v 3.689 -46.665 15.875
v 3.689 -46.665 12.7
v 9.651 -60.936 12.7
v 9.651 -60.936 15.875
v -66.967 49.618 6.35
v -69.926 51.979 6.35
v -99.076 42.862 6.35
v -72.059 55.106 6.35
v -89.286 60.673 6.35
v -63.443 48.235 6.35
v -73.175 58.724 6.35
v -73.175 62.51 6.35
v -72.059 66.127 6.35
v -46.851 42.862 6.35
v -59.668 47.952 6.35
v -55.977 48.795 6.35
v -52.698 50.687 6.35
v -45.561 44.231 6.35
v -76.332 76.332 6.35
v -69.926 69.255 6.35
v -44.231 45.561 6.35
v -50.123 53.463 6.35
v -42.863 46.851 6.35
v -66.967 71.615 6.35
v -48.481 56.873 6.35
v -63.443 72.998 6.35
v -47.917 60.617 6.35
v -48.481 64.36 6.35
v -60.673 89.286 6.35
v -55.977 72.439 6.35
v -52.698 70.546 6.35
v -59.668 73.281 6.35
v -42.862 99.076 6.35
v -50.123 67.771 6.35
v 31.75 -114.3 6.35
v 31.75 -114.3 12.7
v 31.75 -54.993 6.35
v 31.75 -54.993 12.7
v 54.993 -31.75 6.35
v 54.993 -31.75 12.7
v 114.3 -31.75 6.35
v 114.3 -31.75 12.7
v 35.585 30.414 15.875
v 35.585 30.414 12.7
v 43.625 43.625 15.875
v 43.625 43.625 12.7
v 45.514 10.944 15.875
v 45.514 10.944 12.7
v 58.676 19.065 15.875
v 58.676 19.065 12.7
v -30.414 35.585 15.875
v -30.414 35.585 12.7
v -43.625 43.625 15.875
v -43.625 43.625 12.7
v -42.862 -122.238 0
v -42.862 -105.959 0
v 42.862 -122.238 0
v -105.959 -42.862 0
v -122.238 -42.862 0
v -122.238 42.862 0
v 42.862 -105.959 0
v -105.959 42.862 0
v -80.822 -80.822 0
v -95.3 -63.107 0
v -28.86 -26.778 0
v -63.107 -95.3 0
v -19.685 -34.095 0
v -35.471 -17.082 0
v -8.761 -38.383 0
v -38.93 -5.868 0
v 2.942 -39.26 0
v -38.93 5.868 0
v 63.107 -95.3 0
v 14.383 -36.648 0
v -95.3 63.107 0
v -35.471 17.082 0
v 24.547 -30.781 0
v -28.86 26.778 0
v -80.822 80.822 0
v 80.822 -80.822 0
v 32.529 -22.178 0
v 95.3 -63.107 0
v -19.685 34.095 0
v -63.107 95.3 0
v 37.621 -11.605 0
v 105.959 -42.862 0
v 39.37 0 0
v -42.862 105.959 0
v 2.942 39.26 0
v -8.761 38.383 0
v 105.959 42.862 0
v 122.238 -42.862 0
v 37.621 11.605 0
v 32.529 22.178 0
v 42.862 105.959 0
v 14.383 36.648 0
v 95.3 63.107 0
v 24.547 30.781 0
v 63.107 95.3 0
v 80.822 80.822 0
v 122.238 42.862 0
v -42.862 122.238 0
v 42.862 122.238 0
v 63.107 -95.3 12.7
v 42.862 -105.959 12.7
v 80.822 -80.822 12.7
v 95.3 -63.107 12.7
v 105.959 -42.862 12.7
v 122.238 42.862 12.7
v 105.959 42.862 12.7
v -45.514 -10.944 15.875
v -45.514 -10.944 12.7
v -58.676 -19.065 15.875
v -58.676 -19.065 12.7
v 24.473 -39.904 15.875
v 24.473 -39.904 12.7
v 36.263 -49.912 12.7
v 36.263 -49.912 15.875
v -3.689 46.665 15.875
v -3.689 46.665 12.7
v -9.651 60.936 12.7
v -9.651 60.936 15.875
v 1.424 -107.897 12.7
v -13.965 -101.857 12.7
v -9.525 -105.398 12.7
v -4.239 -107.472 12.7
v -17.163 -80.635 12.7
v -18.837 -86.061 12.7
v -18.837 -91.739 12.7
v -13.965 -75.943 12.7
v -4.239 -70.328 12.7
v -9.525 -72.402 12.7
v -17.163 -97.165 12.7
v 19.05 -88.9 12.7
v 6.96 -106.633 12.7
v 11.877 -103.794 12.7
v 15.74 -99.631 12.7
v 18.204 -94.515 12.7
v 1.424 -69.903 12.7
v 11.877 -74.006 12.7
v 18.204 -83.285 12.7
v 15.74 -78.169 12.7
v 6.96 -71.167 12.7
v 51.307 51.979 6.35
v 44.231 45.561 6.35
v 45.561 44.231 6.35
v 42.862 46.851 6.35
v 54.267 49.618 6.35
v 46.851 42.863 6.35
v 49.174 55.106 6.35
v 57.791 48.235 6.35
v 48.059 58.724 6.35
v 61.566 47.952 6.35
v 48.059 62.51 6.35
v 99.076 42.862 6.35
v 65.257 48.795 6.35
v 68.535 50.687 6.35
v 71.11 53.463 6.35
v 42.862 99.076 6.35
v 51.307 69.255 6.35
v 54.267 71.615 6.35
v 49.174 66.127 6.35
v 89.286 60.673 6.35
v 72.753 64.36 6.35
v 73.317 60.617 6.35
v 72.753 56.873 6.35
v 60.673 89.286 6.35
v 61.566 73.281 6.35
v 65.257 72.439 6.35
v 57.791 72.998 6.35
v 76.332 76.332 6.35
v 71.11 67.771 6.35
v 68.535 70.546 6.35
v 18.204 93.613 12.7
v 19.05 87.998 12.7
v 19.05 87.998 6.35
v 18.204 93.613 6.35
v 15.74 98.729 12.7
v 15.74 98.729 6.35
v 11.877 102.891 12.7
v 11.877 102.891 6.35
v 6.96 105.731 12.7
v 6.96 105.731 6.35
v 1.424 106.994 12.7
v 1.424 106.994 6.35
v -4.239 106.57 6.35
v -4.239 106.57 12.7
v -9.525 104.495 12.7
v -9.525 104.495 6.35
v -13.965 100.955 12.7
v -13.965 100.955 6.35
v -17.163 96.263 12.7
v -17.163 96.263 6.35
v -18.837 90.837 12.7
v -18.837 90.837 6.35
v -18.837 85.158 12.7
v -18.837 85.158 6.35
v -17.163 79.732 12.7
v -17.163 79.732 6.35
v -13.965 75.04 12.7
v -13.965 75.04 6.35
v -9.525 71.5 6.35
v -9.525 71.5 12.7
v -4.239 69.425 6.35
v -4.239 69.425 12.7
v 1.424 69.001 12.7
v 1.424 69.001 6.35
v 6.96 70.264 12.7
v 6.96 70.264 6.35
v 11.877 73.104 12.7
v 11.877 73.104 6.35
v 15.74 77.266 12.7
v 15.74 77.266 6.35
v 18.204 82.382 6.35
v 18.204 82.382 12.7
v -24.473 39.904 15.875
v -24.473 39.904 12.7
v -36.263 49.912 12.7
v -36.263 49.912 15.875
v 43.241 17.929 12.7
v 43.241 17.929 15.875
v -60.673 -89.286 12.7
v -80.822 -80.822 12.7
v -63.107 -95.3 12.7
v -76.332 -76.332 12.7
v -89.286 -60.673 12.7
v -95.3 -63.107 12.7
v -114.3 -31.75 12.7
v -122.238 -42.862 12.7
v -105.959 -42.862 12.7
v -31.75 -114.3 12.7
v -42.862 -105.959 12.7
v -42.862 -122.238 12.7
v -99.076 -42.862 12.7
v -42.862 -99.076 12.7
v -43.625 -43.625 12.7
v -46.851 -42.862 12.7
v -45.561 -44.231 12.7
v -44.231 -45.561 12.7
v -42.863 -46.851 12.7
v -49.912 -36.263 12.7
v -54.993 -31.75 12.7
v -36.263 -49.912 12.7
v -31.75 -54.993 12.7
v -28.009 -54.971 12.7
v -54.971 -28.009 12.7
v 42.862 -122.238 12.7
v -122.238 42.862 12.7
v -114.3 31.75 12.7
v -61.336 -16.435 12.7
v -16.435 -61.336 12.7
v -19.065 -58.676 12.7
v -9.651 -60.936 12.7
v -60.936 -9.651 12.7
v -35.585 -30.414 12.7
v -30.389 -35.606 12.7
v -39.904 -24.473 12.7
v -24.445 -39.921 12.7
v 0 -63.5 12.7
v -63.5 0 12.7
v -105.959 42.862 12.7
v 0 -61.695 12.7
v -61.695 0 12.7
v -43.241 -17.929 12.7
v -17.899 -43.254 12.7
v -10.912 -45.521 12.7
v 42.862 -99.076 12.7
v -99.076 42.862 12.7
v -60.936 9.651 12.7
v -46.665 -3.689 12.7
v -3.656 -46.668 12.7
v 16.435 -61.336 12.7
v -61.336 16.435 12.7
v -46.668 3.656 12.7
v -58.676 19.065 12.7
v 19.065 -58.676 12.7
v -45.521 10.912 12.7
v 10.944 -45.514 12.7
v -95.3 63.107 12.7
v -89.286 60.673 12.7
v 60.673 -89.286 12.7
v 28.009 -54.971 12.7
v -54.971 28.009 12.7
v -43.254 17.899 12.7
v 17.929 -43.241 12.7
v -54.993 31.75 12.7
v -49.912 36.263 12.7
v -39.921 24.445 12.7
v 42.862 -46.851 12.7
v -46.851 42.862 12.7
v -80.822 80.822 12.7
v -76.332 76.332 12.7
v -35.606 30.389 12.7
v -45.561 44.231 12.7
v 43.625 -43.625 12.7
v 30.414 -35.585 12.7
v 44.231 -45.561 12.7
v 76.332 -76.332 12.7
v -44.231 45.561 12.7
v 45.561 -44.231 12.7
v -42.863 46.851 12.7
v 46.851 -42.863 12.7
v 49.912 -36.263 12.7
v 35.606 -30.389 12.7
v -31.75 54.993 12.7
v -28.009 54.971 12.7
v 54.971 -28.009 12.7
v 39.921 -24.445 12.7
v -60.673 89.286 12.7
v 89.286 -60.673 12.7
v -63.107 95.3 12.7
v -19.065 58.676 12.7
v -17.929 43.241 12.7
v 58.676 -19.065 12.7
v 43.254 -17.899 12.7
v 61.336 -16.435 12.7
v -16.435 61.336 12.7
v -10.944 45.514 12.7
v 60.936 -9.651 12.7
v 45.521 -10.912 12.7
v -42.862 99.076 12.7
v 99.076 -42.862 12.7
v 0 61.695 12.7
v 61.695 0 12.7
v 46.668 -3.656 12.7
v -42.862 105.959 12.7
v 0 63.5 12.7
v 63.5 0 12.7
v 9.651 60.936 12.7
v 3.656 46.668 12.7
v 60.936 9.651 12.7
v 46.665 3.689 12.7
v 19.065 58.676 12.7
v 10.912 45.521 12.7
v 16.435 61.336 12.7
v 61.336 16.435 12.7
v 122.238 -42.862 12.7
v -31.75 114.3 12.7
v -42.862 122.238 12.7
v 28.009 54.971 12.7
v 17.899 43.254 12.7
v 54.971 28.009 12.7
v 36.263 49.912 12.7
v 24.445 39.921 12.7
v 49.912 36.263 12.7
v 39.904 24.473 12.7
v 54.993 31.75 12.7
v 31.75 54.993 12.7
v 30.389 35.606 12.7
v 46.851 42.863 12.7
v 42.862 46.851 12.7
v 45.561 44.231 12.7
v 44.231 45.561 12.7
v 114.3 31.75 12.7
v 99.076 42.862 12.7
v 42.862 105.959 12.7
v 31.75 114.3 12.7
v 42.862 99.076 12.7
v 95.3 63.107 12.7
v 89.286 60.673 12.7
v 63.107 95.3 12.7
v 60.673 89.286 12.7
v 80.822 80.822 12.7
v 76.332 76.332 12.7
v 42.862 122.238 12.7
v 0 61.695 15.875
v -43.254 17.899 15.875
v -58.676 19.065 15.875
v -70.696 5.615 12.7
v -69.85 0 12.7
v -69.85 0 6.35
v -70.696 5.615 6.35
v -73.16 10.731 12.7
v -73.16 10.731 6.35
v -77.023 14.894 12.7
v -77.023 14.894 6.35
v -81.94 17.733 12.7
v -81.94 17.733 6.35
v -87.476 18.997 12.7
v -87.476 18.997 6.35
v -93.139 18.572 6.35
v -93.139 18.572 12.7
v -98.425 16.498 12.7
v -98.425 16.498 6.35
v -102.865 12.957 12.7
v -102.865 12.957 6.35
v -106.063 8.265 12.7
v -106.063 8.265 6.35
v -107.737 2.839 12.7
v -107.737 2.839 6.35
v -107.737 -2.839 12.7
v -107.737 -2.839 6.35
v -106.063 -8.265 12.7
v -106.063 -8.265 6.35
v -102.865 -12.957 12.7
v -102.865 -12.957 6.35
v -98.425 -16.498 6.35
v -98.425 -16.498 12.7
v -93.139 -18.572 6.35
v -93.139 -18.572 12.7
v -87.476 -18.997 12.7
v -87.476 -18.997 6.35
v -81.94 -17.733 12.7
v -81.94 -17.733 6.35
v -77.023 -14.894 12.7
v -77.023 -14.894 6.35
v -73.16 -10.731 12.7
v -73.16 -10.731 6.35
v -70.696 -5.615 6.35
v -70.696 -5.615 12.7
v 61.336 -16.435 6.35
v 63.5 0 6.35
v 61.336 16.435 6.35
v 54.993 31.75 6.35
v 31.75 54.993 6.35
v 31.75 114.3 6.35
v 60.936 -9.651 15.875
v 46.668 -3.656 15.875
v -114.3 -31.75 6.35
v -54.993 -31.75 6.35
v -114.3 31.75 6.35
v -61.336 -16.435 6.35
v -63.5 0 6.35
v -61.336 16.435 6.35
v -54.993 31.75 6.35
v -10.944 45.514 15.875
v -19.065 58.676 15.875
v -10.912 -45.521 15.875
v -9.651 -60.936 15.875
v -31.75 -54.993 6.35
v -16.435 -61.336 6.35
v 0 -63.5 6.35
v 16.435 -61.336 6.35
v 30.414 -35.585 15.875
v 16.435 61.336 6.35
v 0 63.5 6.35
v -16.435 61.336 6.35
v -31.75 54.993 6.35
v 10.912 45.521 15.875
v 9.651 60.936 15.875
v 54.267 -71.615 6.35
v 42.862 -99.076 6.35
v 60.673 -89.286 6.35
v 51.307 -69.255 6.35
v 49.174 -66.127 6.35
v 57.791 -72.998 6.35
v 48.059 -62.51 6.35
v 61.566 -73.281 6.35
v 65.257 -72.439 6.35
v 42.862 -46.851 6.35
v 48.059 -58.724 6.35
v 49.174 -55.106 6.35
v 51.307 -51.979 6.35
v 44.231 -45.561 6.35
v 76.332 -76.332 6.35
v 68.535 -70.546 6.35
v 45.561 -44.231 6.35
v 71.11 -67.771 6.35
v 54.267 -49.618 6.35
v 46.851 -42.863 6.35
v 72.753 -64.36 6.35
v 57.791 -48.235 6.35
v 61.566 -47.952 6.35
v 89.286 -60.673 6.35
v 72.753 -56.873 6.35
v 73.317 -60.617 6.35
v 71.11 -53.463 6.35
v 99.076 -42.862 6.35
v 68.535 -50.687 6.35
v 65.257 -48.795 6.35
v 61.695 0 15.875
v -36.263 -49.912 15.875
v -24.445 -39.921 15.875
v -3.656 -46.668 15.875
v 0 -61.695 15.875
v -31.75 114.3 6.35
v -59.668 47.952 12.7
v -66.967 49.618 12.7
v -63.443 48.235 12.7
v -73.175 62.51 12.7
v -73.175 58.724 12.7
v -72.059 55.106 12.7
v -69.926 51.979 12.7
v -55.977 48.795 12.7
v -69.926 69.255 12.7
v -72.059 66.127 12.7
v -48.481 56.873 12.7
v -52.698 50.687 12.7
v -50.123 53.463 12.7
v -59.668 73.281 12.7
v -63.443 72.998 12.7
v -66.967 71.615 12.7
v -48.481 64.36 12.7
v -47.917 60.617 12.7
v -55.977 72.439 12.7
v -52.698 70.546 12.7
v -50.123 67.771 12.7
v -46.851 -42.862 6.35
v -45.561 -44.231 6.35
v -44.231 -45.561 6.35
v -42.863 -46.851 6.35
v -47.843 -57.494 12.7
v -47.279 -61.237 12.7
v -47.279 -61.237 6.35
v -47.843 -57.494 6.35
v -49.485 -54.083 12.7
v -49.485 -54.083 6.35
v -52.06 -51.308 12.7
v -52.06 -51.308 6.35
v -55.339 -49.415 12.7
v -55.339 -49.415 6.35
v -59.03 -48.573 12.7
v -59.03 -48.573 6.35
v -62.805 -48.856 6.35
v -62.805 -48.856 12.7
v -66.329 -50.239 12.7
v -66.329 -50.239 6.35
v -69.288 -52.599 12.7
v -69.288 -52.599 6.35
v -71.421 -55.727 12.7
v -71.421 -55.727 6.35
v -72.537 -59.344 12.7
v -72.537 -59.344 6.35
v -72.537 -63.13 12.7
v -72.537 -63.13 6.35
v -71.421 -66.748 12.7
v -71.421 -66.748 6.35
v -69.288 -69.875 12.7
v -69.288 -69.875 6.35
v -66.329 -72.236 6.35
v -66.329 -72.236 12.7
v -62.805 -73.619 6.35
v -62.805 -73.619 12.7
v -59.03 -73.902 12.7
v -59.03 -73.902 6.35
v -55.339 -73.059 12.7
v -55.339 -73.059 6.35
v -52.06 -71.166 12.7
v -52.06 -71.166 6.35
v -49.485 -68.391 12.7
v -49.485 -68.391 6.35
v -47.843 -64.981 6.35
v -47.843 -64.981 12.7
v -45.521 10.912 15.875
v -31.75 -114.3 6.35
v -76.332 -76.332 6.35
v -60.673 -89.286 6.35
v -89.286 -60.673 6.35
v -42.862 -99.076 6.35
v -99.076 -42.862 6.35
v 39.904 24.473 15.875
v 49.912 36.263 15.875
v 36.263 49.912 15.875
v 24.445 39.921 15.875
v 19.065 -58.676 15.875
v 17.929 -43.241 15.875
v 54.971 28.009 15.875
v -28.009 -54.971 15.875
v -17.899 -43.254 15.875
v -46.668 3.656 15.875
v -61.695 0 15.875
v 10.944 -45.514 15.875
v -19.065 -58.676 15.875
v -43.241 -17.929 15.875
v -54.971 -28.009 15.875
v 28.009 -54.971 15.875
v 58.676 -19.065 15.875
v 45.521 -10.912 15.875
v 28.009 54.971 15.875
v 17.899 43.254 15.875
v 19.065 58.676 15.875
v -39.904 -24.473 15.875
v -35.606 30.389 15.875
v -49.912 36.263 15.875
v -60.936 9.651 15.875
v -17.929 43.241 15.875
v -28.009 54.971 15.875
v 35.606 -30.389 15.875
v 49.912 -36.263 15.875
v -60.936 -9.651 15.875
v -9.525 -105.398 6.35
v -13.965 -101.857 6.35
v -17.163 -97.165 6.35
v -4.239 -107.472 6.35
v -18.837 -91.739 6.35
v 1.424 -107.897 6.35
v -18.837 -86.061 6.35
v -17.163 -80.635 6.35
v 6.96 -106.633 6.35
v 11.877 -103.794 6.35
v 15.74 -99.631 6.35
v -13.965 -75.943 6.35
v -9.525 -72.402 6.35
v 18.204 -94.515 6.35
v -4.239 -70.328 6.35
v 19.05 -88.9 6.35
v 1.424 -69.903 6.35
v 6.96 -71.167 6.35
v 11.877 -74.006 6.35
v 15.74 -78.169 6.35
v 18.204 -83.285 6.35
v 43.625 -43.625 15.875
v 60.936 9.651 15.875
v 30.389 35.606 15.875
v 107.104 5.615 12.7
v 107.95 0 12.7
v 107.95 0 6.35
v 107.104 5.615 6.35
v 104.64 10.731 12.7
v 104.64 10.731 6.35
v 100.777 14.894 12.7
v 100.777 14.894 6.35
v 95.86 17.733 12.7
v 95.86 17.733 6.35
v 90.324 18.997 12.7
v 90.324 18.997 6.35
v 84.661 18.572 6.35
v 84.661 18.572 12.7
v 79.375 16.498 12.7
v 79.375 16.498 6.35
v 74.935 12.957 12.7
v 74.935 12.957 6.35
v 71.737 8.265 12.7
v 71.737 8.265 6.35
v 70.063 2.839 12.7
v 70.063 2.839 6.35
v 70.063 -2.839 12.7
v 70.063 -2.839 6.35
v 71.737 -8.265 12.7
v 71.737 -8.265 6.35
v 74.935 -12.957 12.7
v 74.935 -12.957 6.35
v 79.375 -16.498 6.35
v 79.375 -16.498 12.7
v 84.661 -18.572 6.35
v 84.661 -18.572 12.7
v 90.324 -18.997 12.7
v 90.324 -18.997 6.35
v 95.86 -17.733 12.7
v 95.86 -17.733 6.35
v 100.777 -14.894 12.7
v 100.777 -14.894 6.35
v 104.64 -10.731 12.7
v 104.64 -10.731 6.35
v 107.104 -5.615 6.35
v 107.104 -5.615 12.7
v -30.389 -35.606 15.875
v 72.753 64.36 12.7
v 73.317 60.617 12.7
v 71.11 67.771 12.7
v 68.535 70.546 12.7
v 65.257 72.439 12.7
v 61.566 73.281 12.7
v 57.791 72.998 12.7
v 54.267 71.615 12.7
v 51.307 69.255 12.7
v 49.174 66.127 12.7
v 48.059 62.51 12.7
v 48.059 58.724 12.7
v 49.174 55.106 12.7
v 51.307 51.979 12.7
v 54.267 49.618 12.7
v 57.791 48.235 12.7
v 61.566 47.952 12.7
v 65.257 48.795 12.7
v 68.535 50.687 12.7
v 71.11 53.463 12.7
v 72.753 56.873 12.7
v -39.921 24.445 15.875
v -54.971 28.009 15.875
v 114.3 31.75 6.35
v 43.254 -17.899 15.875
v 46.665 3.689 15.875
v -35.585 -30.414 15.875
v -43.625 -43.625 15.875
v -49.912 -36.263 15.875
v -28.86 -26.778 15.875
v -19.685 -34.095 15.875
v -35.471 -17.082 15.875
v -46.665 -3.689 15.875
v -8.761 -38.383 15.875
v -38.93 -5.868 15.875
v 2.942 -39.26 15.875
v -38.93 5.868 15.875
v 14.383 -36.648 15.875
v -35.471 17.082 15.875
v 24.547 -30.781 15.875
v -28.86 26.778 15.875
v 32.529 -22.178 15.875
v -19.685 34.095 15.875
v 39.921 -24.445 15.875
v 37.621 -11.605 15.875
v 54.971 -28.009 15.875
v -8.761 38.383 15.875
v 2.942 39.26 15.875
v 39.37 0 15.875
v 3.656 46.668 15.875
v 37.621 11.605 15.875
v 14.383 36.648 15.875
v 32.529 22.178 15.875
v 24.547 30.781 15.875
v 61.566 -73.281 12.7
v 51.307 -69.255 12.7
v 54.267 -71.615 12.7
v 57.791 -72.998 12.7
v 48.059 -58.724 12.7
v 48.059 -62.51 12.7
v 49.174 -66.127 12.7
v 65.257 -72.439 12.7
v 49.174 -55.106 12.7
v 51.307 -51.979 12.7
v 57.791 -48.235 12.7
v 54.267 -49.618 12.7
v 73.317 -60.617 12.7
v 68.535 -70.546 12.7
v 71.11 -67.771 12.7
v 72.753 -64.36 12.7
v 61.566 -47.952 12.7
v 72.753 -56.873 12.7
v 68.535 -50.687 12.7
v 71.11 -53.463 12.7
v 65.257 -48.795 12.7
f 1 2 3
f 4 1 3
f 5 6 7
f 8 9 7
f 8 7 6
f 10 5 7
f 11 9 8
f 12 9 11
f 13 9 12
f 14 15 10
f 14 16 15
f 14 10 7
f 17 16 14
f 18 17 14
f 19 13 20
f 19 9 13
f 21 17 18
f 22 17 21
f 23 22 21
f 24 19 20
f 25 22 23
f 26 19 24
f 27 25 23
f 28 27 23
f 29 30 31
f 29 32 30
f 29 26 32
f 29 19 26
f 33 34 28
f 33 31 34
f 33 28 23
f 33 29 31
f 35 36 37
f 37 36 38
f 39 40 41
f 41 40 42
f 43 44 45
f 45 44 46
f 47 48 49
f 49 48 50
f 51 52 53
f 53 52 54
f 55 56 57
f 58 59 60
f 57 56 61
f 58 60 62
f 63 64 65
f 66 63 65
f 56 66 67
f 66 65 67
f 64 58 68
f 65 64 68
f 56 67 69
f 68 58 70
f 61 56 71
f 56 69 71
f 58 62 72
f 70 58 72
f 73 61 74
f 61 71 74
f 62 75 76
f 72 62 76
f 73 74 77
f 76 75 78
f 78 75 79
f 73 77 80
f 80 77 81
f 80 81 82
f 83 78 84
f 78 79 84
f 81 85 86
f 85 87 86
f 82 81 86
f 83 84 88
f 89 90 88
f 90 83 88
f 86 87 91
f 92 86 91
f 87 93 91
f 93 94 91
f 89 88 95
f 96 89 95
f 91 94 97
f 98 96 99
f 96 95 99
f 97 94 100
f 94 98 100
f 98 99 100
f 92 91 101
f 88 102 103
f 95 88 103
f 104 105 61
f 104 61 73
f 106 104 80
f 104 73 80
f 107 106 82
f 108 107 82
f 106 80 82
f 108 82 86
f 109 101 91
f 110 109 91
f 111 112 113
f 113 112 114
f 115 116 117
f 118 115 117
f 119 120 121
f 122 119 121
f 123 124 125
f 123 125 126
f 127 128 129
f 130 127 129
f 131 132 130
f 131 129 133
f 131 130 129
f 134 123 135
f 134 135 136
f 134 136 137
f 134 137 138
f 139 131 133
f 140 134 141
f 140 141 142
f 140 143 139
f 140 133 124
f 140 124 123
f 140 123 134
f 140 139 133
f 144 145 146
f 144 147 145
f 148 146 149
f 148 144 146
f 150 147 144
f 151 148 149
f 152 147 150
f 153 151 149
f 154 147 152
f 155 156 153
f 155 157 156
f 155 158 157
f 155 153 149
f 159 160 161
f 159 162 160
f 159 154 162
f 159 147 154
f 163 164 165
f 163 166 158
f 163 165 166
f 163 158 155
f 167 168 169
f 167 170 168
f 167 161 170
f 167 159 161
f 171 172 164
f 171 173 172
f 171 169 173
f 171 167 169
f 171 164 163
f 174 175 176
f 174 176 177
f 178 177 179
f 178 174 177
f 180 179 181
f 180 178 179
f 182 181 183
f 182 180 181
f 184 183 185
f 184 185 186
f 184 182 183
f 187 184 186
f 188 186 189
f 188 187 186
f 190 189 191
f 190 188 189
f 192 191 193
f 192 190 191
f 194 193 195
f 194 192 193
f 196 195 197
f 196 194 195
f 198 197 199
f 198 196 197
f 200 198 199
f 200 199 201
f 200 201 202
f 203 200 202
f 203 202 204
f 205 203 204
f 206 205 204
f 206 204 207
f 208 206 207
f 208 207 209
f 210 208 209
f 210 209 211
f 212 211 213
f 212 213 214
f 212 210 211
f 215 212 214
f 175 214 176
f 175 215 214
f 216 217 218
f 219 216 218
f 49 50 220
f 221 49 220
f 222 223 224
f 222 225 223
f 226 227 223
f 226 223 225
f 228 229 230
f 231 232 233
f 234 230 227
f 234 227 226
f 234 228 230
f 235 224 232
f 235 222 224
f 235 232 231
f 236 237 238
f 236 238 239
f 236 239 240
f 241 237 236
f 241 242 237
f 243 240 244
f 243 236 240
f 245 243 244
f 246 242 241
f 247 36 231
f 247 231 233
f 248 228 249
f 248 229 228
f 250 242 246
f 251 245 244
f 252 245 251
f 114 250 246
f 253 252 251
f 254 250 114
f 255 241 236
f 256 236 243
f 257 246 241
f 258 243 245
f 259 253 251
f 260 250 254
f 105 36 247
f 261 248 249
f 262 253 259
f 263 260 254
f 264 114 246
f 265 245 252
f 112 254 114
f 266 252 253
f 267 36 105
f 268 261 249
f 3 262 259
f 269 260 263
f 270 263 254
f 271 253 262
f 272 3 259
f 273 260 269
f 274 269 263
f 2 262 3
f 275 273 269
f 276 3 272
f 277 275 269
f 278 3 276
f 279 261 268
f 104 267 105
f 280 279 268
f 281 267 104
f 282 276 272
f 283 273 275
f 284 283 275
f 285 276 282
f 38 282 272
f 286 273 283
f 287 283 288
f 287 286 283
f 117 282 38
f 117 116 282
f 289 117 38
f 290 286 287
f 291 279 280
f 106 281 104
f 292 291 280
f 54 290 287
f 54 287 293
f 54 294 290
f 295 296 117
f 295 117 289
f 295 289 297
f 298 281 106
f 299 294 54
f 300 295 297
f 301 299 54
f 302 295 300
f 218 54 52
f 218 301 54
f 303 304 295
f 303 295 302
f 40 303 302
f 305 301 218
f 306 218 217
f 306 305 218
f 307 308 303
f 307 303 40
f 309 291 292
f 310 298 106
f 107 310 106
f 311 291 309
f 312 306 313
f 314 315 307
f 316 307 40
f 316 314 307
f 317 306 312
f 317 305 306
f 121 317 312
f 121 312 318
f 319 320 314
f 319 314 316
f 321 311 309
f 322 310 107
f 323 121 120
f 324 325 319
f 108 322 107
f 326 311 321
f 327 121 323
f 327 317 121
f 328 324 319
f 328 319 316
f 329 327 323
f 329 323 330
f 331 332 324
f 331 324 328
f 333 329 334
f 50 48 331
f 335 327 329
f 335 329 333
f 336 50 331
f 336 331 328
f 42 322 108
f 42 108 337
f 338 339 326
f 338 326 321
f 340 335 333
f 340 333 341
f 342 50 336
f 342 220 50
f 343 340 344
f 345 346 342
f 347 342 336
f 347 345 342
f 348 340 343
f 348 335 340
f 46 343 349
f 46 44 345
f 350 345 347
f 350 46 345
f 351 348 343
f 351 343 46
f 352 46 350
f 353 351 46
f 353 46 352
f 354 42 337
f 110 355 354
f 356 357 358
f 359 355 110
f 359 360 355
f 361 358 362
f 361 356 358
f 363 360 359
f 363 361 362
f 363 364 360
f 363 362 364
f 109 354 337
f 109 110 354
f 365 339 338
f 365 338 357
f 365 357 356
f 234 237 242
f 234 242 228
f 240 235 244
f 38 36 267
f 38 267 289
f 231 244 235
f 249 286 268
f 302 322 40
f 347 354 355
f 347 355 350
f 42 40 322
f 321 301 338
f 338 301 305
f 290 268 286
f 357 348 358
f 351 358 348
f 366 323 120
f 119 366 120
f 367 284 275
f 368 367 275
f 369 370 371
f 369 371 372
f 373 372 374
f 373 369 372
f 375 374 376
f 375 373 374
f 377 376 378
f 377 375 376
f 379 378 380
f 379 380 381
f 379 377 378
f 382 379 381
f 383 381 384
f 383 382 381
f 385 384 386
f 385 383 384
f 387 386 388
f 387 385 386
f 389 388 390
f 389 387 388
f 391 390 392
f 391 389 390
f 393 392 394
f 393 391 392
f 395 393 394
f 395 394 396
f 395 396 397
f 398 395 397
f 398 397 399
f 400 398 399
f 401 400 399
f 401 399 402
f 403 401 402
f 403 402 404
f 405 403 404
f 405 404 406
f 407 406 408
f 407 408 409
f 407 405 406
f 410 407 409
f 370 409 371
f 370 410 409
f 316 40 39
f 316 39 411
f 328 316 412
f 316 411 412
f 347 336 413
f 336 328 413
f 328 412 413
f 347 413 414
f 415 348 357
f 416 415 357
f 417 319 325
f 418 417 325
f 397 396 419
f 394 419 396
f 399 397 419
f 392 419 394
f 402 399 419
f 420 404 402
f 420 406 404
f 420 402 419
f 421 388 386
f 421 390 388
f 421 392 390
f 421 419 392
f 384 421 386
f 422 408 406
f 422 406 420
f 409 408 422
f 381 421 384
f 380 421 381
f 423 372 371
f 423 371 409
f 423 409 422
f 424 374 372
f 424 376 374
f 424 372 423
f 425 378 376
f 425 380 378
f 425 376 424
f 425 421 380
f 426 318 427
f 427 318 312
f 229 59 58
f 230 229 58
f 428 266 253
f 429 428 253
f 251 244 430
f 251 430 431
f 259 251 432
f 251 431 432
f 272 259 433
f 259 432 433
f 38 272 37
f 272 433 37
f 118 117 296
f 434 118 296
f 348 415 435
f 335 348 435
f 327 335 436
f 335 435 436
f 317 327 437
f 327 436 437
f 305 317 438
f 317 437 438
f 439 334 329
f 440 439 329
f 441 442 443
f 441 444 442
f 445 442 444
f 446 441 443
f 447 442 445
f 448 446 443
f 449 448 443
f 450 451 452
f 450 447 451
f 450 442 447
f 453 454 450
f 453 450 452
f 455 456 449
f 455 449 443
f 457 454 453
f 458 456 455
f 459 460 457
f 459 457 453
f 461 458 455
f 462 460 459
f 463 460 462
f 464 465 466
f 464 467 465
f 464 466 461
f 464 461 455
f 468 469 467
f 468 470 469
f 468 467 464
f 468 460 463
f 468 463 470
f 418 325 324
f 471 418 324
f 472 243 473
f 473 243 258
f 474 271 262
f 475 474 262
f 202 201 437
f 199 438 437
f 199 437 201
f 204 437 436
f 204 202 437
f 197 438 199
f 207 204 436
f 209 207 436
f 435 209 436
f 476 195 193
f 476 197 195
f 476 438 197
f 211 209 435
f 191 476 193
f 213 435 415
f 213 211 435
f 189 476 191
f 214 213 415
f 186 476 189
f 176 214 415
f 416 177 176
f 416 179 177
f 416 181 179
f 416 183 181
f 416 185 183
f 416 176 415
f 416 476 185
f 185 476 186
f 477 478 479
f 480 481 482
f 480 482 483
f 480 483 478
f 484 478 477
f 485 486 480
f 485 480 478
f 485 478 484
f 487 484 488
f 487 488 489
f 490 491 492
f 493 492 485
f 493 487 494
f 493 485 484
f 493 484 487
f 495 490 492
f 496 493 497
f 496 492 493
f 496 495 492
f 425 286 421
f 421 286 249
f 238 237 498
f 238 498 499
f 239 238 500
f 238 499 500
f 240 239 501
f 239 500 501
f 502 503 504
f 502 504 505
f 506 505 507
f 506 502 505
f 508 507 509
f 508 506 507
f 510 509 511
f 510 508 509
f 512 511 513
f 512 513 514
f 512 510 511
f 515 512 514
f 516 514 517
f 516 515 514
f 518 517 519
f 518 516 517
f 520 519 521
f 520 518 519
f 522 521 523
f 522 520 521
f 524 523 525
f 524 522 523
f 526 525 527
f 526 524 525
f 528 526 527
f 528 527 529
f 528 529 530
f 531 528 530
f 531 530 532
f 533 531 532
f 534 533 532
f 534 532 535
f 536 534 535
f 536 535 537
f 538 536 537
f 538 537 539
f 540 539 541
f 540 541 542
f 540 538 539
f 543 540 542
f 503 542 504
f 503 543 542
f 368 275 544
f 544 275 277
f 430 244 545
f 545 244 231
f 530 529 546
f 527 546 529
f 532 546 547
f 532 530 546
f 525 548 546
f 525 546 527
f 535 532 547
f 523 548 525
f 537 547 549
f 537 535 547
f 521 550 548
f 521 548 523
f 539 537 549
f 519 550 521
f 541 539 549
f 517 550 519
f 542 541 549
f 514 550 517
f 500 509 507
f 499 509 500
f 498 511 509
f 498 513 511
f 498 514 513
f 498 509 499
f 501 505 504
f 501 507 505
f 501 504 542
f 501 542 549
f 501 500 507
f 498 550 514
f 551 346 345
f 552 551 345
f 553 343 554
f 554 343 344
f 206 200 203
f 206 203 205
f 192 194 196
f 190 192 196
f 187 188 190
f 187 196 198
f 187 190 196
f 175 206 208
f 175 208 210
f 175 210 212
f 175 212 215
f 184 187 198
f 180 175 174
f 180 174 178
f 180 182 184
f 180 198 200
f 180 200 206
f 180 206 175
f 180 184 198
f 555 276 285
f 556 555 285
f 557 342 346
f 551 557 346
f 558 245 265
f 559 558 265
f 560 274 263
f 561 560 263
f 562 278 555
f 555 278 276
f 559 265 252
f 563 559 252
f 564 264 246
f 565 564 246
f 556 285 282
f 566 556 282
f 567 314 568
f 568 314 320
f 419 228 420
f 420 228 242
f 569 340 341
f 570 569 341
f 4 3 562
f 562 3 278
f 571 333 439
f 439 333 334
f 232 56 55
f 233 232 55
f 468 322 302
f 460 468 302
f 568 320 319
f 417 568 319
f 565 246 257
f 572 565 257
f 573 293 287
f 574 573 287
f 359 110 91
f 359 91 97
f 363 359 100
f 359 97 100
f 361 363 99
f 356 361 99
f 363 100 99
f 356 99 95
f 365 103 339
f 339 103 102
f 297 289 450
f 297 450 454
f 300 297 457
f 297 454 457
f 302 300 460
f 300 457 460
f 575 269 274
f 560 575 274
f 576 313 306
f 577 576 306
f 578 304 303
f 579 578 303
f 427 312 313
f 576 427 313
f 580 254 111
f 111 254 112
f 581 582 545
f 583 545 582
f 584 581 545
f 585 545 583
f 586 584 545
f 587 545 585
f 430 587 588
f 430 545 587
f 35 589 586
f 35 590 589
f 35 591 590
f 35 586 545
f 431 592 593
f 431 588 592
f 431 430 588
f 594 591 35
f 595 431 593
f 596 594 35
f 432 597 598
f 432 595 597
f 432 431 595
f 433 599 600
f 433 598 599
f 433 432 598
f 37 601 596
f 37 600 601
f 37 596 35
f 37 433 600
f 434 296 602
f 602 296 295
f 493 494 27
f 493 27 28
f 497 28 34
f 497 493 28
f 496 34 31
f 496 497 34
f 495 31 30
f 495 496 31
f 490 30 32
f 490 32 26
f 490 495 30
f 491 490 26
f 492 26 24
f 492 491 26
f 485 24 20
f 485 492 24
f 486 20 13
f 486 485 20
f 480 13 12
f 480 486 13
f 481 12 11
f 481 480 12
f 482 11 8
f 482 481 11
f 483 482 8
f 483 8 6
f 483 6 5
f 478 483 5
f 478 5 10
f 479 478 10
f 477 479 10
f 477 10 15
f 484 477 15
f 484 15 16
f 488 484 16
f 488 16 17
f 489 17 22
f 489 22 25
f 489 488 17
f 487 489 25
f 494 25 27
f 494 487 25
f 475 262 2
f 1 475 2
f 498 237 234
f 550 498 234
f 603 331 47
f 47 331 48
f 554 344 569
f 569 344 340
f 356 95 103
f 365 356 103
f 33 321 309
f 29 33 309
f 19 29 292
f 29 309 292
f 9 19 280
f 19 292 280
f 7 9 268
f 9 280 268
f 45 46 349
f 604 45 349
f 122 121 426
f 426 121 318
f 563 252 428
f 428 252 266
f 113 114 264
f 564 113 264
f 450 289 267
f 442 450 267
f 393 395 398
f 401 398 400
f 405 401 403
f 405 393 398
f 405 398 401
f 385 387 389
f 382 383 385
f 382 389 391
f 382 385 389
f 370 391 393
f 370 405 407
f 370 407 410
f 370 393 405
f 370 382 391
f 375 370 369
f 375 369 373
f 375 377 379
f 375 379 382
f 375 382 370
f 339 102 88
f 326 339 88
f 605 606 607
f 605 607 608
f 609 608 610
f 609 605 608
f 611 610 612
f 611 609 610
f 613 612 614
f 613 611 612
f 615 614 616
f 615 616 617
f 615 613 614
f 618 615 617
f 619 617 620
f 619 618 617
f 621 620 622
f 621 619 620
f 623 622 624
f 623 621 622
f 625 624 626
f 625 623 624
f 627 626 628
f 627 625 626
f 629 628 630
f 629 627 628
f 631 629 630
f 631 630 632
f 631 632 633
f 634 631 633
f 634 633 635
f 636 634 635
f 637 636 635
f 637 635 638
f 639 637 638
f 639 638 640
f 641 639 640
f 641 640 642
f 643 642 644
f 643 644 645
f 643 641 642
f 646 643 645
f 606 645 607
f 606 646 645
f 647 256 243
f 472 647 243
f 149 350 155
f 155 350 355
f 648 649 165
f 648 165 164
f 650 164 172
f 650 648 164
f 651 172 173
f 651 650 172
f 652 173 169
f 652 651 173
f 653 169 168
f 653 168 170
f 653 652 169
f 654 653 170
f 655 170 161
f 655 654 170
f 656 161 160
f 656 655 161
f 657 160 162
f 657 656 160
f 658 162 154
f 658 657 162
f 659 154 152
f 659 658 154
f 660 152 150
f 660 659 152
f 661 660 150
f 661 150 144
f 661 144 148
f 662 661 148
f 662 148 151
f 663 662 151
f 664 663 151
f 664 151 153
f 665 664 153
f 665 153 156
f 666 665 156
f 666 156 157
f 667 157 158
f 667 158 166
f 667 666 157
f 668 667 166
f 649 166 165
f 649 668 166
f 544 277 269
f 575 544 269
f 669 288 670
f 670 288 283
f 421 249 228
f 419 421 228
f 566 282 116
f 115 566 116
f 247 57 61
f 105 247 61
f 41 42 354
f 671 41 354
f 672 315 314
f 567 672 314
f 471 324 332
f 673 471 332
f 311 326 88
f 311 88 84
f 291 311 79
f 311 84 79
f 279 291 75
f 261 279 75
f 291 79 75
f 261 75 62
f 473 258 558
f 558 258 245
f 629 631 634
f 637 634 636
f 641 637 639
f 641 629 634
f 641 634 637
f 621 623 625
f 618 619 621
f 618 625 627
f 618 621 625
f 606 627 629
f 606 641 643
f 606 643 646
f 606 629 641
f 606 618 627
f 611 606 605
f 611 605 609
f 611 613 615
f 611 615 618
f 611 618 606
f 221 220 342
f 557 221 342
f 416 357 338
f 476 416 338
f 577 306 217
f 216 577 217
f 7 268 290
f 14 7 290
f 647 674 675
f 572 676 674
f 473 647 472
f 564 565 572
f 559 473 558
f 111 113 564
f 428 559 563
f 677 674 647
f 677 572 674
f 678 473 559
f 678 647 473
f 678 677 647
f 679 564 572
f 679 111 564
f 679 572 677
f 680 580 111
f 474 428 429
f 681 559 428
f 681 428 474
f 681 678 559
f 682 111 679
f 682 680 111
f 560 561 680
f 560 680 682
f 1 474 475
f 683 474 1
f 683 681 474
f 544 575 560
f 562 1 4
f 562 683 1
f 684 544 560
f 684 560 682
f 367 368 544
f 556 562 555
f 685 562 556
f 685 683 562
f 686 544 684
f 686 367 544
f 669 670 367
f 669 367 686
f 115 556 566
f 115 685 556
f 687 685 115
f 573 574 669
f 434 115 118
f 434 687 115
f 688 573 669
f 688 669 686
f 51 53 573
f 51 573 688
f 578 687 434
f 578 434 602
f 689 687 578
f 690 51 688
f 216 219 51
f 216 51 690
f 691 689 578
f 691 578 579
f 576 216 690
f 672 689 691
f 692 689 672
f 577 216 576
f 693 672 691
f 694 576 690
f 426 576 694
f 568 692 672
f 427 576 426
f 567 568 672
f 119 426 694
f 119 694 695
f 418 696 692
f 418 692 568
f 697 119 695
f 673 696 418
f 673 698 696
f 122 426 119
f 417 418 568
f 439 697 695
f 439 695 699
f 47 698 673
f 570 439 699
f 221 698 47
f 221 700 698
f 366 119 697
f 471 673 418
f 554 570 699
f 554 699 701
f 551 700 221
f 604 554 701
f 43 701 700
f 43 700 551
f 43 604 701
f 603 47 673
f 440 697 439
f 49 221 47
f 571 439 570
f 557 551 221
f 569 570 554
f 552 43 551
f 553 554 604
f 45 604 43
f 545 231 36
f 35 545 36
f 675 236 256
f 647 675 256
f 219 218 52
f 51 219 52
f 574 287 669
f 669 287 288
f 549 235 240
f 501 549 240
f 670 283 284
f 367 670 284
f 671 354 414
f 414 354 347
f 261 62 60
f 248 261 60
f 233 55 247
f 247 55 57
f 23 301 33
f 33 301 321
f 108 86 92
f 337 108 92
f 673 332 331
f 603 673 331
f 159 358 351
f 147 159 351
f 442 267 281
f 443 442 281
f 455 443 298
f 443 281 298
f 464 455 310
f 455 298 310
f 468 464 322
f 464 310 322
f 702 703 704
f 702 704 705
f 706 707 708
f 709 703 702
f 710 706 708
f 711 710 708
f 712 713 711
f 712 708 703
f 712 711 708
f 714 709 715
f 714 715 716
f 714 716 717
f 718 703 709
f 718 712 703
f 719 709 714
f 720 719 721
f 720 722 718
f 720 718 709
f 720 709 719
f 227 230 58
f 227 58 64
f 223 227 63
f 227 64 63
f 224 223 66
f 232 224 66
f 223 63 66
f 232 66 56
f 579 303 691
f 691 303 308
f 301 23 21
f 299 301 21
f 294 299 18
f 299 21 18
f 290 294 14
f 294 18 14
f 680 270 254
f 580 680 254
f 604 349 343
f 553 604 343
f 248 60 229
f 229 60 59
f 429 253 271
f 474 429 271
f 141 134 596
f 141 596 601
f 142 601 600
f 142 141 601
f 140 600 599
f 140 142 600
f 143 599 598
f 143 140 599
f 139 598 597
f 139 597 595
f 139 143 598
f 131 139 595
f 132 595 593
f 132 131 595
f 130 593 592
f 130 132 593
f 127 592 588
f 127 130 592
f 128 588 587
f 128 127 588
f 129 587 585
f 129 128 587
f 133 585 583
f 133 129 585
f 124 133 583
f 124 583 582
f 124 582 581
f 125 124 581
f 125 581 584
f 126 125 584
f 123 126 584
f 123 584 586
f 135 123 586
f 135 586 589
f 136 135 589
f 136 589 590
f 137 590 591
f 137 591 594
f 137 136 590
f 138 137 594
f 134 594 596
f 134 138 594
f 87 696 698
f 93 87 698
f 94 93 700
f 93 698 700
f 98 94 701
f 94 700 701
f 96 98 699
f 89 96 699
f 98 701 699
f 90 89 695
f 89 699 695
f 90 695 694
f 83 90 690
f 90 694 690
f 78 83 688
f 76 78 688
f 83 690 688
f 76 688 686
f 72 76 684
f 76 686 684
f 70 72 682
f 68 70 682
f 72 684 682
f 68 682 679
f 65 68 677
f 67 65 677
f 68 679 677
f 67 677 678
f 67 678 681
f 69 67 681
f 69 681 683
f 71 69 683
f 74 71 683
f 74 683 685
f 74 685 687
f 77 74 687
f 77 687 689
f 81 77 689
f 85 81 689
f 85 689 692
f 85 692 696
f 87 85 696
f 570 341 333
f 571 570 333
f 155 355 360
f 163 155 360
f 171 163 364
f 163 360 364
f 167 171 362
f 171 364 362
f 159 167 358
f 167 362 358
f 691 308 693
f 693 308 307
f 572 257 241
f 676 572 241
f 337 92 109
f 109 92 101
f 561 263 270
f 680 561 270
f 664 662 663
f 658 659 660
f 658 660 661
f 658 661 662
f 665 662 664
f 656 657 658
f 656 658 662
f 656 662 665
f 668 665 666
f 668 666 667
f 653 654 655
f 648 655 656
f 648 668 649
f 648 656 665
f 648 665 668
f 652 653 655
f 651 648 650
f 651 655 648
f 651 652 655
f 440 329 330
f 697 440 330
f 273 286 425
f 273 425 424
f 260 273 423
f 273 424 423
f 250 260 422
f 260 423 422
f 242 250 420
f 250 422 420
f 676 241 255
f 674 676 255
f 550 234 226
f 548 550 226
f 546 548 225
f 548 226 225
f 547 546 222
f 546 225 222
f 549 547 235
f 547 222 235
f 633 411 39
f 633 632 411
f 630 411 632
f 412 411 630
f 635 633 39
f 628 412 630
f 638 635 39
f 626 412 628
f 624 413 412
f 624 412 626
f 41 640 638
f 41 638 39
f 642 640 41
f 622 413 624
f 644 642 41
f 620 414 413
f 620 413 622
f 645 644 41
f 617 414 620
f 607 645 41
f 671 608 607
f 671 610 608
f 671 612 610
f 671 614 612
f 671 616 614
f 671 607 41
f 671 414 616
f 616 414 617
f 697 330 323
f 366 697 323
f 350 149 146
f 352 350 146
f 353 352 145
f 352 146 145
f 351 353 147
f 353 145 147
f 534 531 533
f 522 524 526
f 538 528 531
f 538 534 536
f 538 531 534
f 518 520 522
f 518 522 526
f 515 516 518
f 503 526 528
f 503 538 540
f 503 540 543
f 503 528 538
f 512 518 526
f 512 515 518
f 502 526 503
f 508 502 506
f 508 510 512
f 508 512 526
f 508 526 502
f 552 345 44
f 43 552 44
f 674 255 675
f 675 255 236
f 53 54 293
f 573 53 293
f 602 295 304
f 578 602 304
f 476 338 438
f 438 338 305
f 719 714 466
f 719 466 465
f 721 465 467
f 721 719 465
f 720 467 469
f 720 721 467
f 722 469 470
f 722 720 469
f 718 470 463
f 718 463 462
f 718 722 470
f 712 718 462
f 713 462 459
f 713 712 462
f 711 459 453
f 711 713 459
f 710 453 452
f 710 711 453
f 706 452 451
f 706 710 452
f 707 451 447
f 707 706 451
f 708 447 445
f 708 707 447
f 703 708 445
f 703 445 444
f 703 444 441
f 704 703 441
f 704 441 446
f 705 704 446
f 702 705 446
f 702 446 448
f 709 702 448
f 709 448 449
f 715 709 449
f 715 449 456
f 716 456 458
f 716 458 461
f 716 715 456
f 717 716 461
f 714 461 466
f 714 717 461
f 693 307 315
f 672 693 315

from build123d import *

# Parameters (mm, degrees)
F1_DEPTH  = 12.7
F2_R      = 39.37
F3_DEPTH  = 12.7
F5_DEPTH  = 6.35
F6_R      = 63.5
F6_R_2    = 39.37
F7_DEPTH  = 6.35
F9_DEPTH  = 3.175
F10_R     = 39.37
F11_DEPTH = 3.175
F12_R     = 19.05
F12_R_2   = 12.7
F13_DEPTH = 6.35


with BuildPart() as f1:
    # F0 (on Top) → F1 (new body)
    with BuildSketch(Plane.XY):
        with BuildLine():
            Line((-42.8625, 122.2375), (-42.8625, 105.958936))
            ThreePointArc((-42.8625, 105.958936), (-80.822305, 80.822305), (-105.958936, 42.8625))
            ThreePointArc((-105.958936, 42.8625), (-114.3, 0), (-105.958936, -42.8625))
            ThreePointArc((-105.958936, -42.8625), (-80.822305, -80.822305), (-42.8625, -105.958936))
            ThreePointArc((-42.8625, -105.958936), (0, -114.3), (42.8625, -105.958936))
            ThreePointArc((42.8625, -105.958936), (80.822305, -80.822305), (105.958936, -42.8625))
            Line((105.958936, -42.8625), (122.2375, -42.8625))
            Line((122.2375, -42.8625), (122.2375, 42.8625))
            Line((122.2375, 42.8625), (105.958936, 42.8625))
            ThreePointArc((105.958936, 42.8625), (80.822305, 80.822305), (42.8625, 105.958936))
            Line((42.8625, 105.958936), (42.8625, 122.2375))
            Line((42.8625, 122.2375), (-42.8625, 122.2375))
        make_face()
        with BuildLine():
            ThreePointArc((-105.958936, -42.8625), (-114.3, 0), (-105.958936, 42.8625))
            Line((-105.958936, 42.8625), (-122.2375, 42.8625))
            Line((-122.2375, 42.8625), (-122.2375, -42.8625))
            Line((-122.2375, -42.8625), (-105.958936, -42.8625))
        make_face()
        with BuildLine():
            ThreePointArc((42.8625, -105.958936), (0, -114.3), (-42.8625, -105.958936))
            Line((-42.8625, -105.958936), (-42.8625, -122.2375))
            Line((-42.8625, -122.2375), (42.8625, -122.2375))
            Line((42.8625, -122.2375), (42.8625, -105.958936))
        make_face()
    extrude(amount=F1_DEPTH)

    # F2 (on face) → F3 (cut, through all)
    with BuildSketch(Plane.XY.offset(12.7)):
        Circle(F2_R)
    extrude(amount=-F3_DEPTH, mode=Mode.SUBTRACT)

    # F4 (on face) → F5 (cut)
    with BuildSketch(Plane.XY.offset(12.7)):
        Polygon((31.75, 114.3), (-31.75, 114.3), (-31.75, 31.75), (-114.3, 31.75), (-114.3, -31.75), (-31.75, -31.75), (-31.75, -42.8625), (-31.75, -114.3), (31.75, -114.3), (31.75, -42.8625), (31.75, -31.75), (42.8625, -31.75), (114.3, -31.75), (114.3, 31.75), (31.75, 31.75), align=None)
        with BuildLine():
            Line((-42.8625, -42.8625), (-99.075772, -42.8625))
            ThreePointArc((-99.075772, -42.8625), (-76.332177, -76.332177), (-42.8625, -99.075772))
            Line((-42.8625, -99.075772), (-42.8625, -42.8625))
        make_face()
        with BuildLine():
            Line((42.8625, 42.8625), (99.075772, 42.8625))
            ThreePointArc((99.075772, 42.8625), (76.332177, 76.332177), (42.8625, 99.075772))
            Line((42.8625, 99.075772), (42.8625, 42.8625))
        make_face()
        with BuildLine():
            Line((-42.8625, 42.8625), (-42.8625, 99.075772))
            ThreePointArc((-42.8625, 99.075772), (-76.332177, 76.332177), (-99.075772, 42.8625))
            Line((-99.075772, 42.8625), (-42.8625, 42.8625))
        make_face()
        with BuildLine():
            Line((42.8625, -42.8625), (42.8625, -99.075772))
            ThreePointArc((42.8625, -99.075772), (76.332177, -76.332177), (99.075772, -42.8625))
            Line((99.075772, -42.8625), (42.8625, -42.8625))
        make_face()
    extrude(amount=-F5_DEPTH, mode=Mode.SUBTRACT)

    # F6 (on face) → F7 (join)
    with BuildSketch(Plane.XY.offset(6.35)):
        Circle(F6_R)
        Circle(F6_R_2, mode=Mode.SUBTRACT)
    extrude(amount=F7_DEPTH)

    # F8 (on face) → F9 (join)
    with BuildSketch(Plane.XY.offset(12.7)):
        Polygon((3.656339, 46.667791), (0, 61.695147), (-3.689128, 46.665211), (-9.651247, 60.935578), (-10.943756, 45.513578), (-19.064849, 58.675572), (-17.928912, 43.24125), (-28.009011, 54.970779), (-24.472599, 39.904178), (-36.263498, 49.912423), (-30.41369, 35.584534), (-43.625057, 43.625057), (-35.605894, 30.38868), (-49.912423, 36.263498), (-39.921364, 24.444555), (-54.970779, 28.009011), (-43.253836, 17.898525), (-58.675572, 19.064849), (-45.521256, 10.911774), (-60.935578, 9.651247), (-46.667791, 3.656339), (-61.695147, 0), (-46.665211, -3.689128), (-60.935578, -9.651247), (-45.513578, -10.943756), (-58.675572, -19.064849), (-43.24125, -17.928912), (-54.970779, -28.009011), (-39.904178, -24.472599), (-49.912423, -36.263498), (-35.584534, -30.41369), (-43.625057, -43.625057), (-30.38868, -35.605894), (-36.263498, -49.912423), (-24.444555, -39.921364), (-28.009011, -54.970779), (-17.898525, -43.253836), (-19.064849, -58.675572), (-10.911774, -45.521256), (-9.651247, -60.935578), (-3.656339, -46.667791), (0, -61.695147), (3.689128, -46.665211), (9.651247, -60.935578), (10.943756, -45.513578), (19.064849, -58.675572), (17.928912, -43.24125), (28.009011, -54.970779), (24.472599, -39.904178), (36.263498, -49.912423), (30.41369, -35.584534), (43.625057, -43.625057), (35.605894, -30.38868), (49.912423, -36.263498), (39.921364, -24.444555), (54.970779, -28.009011), (43.253836, -17.898525), (58.675572, -19.064849), (45.521256, -10.911774), (60.935578, -9.651247), (46.667791, -3.656339), (61.695147, 0), (46.665211, 3.689128), (60.935578, 9.651247), (45.513578, 10.943756), (58.675572, 19.064849), (43.24125, 17.928912), (54.970779, 28.009011), (39.904178, 24.472599), (49.912423, 36.263498), (35.584534, 30.41369), (43.625057, 43.625057), (30.38868, 35.605894), (36.263498, 49.912423), (24.444555, 39.921364), (28.009011, 54.970779), (17.898525, 43.253836), (19.064849, 58.675572), (10.911774, 45.521256), (9.651247, 60.935578), align=None)
    extrude(amount=F9_DEPTH)

    # F10 (on face) → F11 (cut, through all)
    with BuildSketch(Plane.XY.offset(15.875)):
        Circle(F10_R)
    extrude(amount=-F11_DEPTH, mode=Mode.SUBTRACT)

    # F12 (on face) → F13 (join)
    with BuildSketch(Plane.XY.offset(12.7)):
        with Locations((0, 87.997574)):
            Circle(F12_R)
        with Locations((60.616729, 60.616729)):
            Circle(F12_R_2)
        with Locations((88.9, 0)):
            Circle(F12_R)
        with Locations((60.616729, -60.616729)):
            Circle(F12_R_2)
        with Locations((0, -88.9)):
            Circle(F12_R)
        with Locations((-59.978617, -61.237198)):
            Circle(F12_R_2)
        with Locations((-88.9, 0)):
            Circle(F12_R)
        with Locations((-60.616729, 60.616729)):
            Circle(F12_R_2)
    extrude(amount=-F13_DEPTH)


solid = f1.part
